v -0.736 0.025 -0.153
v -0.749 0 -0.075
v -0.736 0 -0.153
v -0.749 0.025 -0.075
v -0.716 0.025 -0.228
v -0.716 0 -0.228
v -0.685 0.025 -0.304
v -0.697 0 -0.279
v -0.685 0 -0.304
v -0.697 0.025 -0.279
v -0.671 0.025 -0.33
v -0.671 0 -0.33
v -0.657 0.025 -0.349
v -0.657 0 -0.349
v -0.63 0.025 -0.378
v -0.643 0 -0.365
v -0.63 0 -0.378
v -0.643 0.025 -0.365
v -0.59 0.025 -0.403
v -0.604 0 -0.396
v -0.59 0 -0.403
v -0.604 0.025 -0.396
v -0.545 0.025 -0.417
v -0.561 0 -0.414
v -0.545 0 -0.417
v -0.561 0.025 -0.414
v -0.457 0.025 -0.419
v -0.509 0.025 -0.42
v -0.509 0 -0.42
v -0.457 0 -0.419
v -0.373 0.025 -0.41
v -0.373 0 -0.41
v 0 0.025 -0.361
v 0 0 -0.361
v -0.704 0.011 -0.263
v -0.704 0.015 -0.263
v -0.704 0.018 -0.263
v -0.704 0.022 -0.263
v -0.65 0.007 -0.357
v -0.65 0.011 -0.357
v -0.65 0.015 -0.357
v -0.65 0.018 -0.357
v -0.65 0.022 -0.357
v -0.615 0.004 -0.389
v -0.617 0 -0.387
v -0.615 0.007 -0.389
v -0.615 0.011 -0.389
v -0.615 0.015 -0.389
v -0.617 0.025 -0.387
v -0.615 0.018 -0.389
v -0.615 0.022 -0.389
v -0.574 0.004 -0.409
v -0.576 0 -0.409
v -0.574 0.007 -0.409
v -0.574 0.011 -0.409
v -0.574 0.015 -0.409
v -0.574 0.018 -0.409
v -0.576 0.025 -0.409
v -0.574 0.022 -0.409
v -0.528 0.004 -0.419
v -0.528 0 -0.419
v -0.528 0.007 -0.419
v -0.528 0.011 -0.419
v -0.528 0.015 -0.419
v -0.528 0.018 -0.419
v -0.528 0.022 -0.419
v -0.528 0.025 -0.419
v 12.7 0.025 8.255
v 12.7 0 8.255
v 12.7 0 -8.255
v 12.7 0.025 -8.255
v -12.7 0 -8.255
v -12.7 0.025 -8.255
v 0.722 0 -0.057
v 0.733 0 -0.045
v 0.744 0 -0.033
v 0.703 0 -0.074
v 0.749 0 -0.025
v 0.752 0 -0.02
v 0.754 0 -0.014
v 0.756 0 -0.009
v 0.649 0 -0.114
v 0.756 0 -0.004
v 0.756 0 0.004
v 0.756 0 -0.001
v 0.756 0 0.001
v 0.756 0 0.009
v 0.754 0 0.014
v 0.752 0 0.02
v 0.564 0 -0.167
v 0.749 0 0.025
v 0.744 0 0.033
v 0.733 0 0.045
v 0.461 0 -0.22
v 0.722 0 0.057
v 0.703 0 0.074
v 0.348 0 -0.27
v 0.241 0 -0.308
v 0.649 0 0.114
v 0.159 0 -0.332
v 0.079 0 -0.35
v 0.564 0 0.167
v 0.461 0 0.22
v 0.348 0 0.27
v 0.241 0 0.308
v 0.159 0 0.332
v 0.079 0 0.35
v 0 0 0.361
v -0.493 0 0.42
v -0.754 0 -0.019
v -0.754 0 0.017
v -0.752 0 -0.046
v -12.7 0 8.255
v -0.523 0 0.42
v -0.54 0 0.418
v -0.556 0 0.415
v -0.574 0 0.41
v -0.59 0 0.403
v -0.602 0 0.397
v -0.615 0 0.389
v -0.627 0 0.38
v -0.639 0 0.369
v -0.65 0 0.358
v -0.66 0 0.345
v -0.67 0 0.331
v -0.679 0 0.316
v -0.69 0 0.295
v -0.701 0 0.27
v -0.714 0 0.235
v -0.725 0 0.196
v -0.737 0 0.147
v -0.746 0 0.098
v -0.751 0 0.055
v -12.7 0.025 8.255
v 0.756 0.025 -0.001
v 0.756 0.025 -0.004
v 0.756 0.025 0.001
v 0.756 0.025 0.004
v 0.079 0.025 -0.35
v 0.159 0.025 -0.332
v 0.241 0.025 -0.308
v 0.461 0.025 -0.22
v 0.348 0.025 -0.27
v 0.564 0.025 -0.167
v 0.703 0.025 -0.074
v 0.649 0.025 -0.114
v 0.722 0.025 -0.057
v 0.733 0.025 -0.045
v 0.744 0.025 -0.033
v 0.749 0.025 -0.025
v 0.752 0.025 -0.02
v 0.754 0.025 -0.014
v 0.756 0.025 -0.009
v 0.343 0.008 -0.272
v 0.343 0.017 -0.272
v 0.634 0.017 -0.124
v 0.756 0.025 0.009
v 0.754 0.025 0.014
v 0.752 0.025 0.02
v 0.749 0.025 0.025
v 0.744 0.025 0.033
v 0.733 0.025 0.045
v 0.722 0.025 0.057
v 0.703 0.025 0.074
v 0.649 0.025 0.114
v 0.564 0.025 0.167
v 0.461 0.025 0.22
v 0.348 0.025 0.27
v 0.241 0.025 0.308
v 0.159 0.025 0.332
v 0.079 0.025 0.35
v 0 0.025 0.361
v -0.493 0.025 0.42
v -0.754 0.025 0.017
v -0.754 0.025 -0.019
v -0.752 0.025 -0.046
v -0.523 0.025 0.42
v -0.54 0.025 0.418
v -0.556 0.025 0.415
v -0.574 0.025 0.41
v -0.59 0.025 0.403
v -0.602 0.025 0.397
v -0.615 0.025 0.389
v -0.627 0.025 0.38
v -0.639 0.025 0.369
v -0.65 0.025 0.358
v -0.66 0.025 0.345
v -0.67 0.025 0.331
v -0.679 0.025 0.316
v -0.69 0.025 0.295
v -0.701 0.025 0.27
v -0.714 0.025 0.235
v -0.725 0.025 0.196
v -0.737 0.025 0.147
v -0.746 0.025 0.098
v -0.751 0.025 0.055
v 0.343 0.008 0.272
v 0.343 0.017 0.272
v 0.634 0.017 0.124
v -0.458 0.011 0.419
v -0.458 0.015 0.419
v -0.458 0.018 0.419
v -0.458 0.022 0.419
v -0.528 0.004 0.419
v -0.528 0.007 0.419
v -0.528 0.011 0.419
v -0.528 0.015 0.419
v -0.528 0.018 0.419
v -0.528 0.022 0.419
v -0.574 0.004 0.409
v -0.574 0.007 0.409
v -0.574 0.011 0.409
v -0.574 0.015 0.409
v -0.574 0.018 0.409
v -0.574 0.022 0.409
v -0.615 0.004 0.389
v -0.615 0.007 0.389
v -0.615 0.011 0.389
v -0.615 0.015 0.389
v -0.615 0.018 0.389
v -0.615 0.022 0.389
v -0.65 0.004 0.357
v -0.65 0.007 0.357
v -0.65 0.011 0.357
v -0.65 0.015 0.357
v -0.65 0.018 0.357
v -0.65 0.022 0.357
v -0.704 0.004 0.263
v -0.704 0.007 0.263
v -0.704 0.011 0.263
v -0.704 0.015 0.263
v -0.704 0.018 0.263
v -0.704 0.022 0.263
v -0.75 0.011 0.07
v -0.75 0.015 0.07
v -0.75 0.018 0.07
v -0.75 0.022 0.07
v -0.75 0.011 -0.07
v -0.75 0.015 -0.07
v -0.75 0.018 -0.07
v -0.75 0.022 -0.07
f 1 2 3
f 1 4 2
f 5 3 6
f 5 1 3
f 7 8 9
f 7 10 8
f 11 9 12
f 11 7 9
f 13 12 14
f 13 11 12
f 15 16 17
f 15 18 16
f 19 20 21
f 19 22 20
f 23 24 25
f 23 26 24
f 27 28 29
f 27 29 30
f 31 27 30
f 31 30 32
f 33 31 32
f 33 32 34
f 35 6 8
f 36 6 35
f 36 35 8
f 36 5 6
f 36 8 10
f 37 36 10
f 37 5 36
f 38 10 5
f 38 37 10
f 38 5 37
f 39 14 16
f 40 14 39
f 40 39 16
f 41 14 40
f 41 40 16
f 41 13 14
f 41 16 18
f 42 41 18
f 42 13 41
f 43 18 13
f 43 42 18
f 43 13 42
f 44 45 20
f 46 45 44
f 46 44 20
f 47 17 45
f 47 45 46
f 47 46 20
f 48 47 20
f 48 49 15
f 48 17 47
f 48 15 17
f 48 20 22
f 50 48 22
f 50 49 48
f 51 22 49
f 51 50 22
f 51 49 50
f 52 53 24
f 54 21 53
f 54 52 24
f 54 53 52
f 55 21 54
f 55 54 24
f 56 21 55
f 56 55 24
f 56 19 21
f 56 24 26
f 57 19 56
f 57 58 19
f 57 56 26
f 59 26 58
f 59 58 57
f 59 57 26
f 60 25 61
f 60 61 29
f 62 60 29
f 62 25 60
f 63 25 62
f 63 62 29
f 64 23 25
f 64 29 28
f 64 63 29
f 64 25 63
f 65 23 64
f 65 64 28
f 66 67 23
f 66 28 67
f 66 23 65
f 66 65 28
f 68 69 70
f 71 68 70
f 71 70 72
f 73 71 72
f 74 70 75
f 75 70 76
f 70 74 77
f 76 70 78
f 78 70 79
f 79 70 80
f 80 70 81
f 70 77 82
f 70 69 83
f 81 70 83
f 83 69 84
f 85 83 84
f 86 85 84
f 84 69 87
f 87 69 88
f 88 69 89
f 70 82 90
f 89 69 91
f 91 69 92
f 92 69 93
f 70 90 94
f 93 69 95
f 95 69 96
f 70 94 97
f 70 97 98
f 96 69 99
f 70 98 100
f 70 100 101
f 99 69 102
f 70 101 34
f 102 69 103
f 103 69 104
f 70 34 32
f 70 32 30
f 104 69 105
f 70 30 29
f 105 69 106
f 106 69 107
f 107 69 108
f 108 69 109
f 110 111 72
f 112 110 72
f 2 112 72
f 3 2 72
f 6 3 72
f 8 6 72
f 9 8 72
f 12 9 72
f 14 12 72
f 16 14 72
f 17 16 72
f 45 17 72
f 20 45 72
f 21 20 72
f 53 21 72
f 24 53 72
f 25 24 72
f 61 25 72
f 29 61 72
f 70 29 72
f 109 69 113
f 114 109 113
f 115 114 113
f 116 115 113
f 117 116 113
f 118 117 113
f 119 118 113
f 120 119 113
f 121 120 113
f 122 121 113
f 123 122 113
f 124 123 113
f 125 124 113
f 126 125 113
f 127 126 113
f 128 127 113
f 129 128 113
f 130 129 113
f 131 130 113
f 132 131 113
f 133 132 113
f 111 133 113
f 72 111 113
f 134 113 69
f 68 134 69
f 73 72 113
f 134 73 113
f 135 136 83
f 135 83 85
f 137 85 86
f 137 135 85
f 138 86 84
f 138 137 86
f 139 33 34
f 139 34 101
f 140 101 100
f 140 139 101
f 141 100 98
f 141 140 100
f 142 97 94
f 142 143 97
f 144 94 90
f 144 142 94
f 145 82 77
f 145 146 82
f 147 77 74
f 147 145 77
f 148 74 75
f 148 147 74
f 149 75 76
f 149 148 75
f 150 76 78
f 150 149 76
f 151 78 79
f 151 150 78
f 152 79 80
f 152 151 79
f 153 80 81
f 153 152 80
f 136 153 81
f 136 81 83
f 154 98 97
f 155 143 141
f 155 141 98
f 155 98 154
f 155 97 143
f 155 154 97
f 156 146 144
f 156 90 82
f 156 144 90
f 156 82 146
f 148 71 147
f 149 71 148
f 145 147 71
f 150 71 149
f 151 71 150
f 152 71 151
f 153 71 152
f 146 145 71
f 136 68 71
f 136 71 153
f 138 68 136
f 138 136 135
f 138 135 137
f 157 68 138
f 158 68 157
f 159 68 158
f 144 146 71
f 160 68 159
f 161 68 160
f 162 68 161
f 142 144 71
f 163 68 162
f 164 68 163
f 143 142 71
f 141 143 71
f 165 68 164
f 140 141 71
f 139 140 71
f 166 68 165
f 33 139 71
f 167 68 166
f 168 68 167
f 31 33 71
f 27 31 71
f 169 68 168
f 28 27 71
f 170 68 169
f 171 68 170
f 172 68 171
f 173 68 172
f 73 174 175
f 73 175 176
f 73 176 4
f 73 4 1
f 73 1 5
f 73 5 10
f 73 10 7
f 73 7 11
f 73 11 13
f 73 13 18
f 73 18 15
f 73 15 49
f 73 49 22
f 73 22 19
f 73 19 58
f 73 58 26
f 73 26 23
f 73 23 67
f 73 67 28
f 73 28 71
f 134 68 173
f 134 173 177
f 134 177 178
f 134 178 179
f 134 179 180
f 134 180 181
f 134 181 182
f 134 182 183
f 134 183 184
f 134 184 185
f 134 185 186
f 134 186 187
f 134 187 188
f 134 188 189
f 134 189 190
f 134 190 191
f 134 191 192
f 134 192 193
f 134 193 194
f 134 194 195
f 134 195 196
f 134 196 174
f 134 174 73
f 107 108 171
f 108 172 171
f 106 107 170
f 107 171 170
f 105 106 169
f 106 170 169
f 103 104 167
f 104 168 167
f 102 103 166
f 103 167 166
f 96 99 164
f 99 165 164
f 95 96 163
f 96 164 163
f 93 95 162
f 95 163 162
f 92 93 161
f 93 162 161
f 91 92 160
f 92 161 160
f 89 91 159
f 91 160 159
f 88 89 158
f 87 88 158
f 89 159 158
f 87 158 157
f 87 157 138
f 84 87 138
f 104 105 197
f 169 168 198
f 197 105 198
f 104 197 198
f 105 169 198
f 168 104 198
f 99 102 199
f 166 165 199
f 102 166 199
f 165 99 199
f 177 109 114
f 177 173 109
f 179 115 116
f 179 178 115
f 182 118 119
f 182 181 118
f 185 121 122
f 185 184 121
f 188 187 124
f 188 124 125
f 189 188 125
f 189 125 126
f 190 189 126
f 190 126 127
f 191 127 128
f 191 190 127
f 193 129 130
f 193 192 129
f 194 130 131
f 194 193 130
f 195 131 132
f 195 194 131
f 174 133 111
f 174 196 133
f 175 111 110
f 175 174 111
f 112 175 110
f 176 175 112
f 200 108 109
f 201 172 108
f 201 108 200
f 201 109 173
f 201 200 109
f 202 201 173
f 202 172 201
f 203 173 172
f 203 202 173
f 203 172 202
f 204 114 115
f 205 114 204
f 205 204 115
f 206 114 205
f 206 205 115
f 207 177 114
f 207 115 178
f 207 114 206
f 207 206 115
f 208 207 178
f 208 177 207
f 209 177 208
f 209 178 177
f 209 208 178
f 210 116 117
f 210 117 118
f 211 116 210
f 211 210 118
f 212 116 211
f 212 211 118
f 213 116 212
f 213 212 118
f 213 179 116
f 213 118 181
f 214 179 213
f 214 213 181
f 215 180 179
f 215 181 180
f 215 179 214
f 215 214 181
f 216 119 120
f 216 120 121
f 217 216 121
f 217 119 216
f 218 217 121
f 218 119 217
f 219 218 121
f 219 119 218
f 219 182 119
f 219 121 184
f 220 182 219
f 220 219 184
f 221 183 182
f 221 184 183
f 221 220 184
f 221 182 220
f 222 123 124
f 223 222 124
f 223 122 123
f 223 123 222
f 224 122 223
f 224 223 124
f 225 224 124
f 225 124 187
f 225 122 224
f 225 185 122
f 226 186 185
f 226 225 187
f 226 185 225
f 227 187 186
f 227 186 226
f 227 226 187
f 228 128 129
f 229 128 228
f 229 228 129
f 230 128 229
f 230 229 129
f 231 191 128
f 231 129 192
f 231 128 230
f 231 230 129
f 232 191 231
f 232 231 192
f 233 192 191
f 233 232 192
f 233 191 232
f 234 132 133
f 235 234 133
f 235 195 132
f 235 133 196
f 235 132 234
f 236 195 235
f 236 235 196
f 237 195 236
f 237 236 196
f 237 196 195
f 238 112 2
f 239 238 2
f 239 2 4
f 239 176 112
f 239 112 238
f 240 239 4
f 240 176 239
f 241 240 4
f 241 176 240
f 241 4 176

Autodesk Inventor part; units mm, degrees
ref_plane "YZ Plane" through (0, 0, 0) normal (1, 0, 0) x (0, 1, 0)
ref_plane "XZ Plane" through (0, 0, 0) normal (0, 1, 0) x (-1, 0, 0)
ref_plane "XY Plane" through (0, 0, 0) normal (0, 0, 1) x (1, 0, 0)
sketch "stock_cut_for_holder" plane through (0, 0, 0) normal (0, 1, 0) x (-1, 0, 0)
  line L0 (-12.7, -8.255) -> (12.7, -8.255)
  line L1 (12.7, -8.255) -> (12.7, 8.255)
  line L2 (12.7, 8.255) -> (-12.7, 8.255)
  line L3 (-12.7, 8.255) -> (-12.7, -8.255)
  line L4 (-12.7, -8.255) -> (12.7, 8.255) construction
  line L5 (12.7, -8.255) -> (-12.7, 8.255) construction
  point P0 (0, 0)
  dimension "cut_shim_height" = 25.4
  dimension "cut_shim_width" = 16.51
extrude "Plate1" add sketch "stock_cut_for_holder" along normal blind 0.0254
sketch "mill_path" plane through (0, 0.0254, 0) normal (0, 1, 0) x (1, 0, 0)
  line L0 (12.7, 8.255) -> (12.7, -8.255) projected
  line L1 (-12.7, 8.255) -> (12.7, 8.255) projected
  line L2 (-12.7, -8.255) -> (-12.7, 8.255) projected
  line L3 (12.7, -8.255) -> (-12.7, -8.255) projected
  line L4 (-12.7, 8.255) -> (-12.7, -8.255) projected
  line L5 (-12.7, 0) -> (12.7, 0) construction
  line L6 (12.7, -8.255) -> (12.7, 8.255) projected
  line L7 (0, 0) -> (0, -0.3607) construction
  line L8 (0, 0) -> (0, 0.3607) construction
  line L9 (-0.4318, 0) -> (-0.4318, -0.4191) construction
  line L10 (-0.4318, 0) -> (-0.4318, 0.4191) construction
  line L11 (0.508, 0) -> (0.508, -0.1969) construction
  line L12 (-0.6731, 0) -> (-0.6731, -0.4064) construction
  line L13 (0.508, 0) -> (0.508, 0.1968) construction
  line L14 (-0.6731, 0) -> (-0.6731, 0.4064) construction
  line L15 (-0.5334, 0) -> (-0.5334, -0.4318) construction
  line L16 (-0.5334, 0) -> (-0.5334, 0.4318) construction
  line L17 (0.508, 0) -> (0.508, 0.1968) construction
  line L18 (-0.7493, 0) -> (-0.7493, -0.127) construction
  line L19 (-0.7493, 0) -> (-0.7493, 0.127)
  line L20 (0.7366, 0) -> (0.7366, -0.0419) construction
  line L21 (0.7366, 0) -> (0.7366, 0.0419) construction
  spline S0 degree 3 poles (0, -0.3607) (0.3354, -0.3292) (0.7751, -0.0715) (0.7556, 0) knots 0 0 0 0 1 1 1 1
  spline S1 degree 3 poles (0, 0.3607) (0.3354, 0.3292) (0.7751, 0.0715) (0.7556, 0) knots 0 0 0 0 1 1 1 1
  line L22 (0, -0.3607) -> (-0.4318, -0.4191) construction
  line L23 (-0.4318, -0.4191) -> (-0.5334, -0.4318) construction
  line L24 (-0.5334, -0.4318) -> (-0.6731, -0.4064) construction
  line L25 (-0.6731, -0.4064) -> (-0.7493, -0.127) construction
  line L26 (-0.7493, -0.127) -> (-0.7576, 0) construction
  line L27 (-0.7576, 0) -> (-0.7493, 0.127) construction
  line L28 (-0.7493, 0.127) -> (-0.6731, 0.4064) construction
  line L29 (-0.6731, 0.4064) -> (-0.5334, 0.4318) construction
  line L30 (-0.5334, 0.4318) -> (-0.4318, 0.4191) construction
  line L31 (-0.4318, 0.4191) -> (0, 0.3607) construction
  spline S2 degree 4 poles (0, -0.3607) (-0.4318, -0.4191) (-0.5334, -0.4318) (-0.6731, -0.4064) (-0.7493, -0.127) (-0.7576, 0) (-0.7493, 0.127) (-0.6731, 0.4064) (-0.5334, 0.4318) (-0.4318, 0.4191) (0, 0.3607) knots 1 1 1 1 1 2 3 4 5 6 7 8 8 8 8 8
  dimension "half_mid_thorax_width" = 0.3607
  dimension "mid_thorax_to_prescutum" = 0.4318
  dimension "w2" = 0.4191
  dimension "d9" = 0.1968
  dimension "mid_thorax_to_anterior_scutellum" = 0.508
  dimension "d11" = 0.4064
  dimension "d13" = 0.4318
  dimension "head_thorax" = 0.1016
  dimension "d15" = 0.1397
  dimension "d17" = 0.127
  dimension "d18" = 0.0762
  dimension "scutellum_taper" = 0.2286
  dimension "d20" = 0.0419
  dimension "d21" = 0.0191
  dimension "d22" = 0.0083
  dimension "d24" = 0.3175
  dimension "d25" = 1.5132
extrude "milled_hole" cut sketch "mill_path" against normal blind 0.0254 contours S2 S1 S0
fillet "Corner Round1" radius 0.127 1 edges at (0.7556, 0.0127, 0)
equation "\"d26\" = Thickness"
equation "\"BendRadius\" = Thickness"
equation "\"BendReliefWidth\" = Thickness"
equation "\"BendReliefDepth\" = 0.5 * Thickness"
equation "\"CornerReliefSize\" = 4 * Thickness"
equation "\"MinimumRemnant\" = 2 * Thickness"
equation "\"TransitionRadius\" = BendRadius"
equation "\"JacobiRadiusSize\" = BendRadius"
equation "\"GapSize\" = Thickness"
equation "\"d2\" = BendRadius"
equation "\"Thickness\" = 0.0254"
properties part number "antennal_lobe_v01_kumato" material "Stainless Steel AISI 317"
